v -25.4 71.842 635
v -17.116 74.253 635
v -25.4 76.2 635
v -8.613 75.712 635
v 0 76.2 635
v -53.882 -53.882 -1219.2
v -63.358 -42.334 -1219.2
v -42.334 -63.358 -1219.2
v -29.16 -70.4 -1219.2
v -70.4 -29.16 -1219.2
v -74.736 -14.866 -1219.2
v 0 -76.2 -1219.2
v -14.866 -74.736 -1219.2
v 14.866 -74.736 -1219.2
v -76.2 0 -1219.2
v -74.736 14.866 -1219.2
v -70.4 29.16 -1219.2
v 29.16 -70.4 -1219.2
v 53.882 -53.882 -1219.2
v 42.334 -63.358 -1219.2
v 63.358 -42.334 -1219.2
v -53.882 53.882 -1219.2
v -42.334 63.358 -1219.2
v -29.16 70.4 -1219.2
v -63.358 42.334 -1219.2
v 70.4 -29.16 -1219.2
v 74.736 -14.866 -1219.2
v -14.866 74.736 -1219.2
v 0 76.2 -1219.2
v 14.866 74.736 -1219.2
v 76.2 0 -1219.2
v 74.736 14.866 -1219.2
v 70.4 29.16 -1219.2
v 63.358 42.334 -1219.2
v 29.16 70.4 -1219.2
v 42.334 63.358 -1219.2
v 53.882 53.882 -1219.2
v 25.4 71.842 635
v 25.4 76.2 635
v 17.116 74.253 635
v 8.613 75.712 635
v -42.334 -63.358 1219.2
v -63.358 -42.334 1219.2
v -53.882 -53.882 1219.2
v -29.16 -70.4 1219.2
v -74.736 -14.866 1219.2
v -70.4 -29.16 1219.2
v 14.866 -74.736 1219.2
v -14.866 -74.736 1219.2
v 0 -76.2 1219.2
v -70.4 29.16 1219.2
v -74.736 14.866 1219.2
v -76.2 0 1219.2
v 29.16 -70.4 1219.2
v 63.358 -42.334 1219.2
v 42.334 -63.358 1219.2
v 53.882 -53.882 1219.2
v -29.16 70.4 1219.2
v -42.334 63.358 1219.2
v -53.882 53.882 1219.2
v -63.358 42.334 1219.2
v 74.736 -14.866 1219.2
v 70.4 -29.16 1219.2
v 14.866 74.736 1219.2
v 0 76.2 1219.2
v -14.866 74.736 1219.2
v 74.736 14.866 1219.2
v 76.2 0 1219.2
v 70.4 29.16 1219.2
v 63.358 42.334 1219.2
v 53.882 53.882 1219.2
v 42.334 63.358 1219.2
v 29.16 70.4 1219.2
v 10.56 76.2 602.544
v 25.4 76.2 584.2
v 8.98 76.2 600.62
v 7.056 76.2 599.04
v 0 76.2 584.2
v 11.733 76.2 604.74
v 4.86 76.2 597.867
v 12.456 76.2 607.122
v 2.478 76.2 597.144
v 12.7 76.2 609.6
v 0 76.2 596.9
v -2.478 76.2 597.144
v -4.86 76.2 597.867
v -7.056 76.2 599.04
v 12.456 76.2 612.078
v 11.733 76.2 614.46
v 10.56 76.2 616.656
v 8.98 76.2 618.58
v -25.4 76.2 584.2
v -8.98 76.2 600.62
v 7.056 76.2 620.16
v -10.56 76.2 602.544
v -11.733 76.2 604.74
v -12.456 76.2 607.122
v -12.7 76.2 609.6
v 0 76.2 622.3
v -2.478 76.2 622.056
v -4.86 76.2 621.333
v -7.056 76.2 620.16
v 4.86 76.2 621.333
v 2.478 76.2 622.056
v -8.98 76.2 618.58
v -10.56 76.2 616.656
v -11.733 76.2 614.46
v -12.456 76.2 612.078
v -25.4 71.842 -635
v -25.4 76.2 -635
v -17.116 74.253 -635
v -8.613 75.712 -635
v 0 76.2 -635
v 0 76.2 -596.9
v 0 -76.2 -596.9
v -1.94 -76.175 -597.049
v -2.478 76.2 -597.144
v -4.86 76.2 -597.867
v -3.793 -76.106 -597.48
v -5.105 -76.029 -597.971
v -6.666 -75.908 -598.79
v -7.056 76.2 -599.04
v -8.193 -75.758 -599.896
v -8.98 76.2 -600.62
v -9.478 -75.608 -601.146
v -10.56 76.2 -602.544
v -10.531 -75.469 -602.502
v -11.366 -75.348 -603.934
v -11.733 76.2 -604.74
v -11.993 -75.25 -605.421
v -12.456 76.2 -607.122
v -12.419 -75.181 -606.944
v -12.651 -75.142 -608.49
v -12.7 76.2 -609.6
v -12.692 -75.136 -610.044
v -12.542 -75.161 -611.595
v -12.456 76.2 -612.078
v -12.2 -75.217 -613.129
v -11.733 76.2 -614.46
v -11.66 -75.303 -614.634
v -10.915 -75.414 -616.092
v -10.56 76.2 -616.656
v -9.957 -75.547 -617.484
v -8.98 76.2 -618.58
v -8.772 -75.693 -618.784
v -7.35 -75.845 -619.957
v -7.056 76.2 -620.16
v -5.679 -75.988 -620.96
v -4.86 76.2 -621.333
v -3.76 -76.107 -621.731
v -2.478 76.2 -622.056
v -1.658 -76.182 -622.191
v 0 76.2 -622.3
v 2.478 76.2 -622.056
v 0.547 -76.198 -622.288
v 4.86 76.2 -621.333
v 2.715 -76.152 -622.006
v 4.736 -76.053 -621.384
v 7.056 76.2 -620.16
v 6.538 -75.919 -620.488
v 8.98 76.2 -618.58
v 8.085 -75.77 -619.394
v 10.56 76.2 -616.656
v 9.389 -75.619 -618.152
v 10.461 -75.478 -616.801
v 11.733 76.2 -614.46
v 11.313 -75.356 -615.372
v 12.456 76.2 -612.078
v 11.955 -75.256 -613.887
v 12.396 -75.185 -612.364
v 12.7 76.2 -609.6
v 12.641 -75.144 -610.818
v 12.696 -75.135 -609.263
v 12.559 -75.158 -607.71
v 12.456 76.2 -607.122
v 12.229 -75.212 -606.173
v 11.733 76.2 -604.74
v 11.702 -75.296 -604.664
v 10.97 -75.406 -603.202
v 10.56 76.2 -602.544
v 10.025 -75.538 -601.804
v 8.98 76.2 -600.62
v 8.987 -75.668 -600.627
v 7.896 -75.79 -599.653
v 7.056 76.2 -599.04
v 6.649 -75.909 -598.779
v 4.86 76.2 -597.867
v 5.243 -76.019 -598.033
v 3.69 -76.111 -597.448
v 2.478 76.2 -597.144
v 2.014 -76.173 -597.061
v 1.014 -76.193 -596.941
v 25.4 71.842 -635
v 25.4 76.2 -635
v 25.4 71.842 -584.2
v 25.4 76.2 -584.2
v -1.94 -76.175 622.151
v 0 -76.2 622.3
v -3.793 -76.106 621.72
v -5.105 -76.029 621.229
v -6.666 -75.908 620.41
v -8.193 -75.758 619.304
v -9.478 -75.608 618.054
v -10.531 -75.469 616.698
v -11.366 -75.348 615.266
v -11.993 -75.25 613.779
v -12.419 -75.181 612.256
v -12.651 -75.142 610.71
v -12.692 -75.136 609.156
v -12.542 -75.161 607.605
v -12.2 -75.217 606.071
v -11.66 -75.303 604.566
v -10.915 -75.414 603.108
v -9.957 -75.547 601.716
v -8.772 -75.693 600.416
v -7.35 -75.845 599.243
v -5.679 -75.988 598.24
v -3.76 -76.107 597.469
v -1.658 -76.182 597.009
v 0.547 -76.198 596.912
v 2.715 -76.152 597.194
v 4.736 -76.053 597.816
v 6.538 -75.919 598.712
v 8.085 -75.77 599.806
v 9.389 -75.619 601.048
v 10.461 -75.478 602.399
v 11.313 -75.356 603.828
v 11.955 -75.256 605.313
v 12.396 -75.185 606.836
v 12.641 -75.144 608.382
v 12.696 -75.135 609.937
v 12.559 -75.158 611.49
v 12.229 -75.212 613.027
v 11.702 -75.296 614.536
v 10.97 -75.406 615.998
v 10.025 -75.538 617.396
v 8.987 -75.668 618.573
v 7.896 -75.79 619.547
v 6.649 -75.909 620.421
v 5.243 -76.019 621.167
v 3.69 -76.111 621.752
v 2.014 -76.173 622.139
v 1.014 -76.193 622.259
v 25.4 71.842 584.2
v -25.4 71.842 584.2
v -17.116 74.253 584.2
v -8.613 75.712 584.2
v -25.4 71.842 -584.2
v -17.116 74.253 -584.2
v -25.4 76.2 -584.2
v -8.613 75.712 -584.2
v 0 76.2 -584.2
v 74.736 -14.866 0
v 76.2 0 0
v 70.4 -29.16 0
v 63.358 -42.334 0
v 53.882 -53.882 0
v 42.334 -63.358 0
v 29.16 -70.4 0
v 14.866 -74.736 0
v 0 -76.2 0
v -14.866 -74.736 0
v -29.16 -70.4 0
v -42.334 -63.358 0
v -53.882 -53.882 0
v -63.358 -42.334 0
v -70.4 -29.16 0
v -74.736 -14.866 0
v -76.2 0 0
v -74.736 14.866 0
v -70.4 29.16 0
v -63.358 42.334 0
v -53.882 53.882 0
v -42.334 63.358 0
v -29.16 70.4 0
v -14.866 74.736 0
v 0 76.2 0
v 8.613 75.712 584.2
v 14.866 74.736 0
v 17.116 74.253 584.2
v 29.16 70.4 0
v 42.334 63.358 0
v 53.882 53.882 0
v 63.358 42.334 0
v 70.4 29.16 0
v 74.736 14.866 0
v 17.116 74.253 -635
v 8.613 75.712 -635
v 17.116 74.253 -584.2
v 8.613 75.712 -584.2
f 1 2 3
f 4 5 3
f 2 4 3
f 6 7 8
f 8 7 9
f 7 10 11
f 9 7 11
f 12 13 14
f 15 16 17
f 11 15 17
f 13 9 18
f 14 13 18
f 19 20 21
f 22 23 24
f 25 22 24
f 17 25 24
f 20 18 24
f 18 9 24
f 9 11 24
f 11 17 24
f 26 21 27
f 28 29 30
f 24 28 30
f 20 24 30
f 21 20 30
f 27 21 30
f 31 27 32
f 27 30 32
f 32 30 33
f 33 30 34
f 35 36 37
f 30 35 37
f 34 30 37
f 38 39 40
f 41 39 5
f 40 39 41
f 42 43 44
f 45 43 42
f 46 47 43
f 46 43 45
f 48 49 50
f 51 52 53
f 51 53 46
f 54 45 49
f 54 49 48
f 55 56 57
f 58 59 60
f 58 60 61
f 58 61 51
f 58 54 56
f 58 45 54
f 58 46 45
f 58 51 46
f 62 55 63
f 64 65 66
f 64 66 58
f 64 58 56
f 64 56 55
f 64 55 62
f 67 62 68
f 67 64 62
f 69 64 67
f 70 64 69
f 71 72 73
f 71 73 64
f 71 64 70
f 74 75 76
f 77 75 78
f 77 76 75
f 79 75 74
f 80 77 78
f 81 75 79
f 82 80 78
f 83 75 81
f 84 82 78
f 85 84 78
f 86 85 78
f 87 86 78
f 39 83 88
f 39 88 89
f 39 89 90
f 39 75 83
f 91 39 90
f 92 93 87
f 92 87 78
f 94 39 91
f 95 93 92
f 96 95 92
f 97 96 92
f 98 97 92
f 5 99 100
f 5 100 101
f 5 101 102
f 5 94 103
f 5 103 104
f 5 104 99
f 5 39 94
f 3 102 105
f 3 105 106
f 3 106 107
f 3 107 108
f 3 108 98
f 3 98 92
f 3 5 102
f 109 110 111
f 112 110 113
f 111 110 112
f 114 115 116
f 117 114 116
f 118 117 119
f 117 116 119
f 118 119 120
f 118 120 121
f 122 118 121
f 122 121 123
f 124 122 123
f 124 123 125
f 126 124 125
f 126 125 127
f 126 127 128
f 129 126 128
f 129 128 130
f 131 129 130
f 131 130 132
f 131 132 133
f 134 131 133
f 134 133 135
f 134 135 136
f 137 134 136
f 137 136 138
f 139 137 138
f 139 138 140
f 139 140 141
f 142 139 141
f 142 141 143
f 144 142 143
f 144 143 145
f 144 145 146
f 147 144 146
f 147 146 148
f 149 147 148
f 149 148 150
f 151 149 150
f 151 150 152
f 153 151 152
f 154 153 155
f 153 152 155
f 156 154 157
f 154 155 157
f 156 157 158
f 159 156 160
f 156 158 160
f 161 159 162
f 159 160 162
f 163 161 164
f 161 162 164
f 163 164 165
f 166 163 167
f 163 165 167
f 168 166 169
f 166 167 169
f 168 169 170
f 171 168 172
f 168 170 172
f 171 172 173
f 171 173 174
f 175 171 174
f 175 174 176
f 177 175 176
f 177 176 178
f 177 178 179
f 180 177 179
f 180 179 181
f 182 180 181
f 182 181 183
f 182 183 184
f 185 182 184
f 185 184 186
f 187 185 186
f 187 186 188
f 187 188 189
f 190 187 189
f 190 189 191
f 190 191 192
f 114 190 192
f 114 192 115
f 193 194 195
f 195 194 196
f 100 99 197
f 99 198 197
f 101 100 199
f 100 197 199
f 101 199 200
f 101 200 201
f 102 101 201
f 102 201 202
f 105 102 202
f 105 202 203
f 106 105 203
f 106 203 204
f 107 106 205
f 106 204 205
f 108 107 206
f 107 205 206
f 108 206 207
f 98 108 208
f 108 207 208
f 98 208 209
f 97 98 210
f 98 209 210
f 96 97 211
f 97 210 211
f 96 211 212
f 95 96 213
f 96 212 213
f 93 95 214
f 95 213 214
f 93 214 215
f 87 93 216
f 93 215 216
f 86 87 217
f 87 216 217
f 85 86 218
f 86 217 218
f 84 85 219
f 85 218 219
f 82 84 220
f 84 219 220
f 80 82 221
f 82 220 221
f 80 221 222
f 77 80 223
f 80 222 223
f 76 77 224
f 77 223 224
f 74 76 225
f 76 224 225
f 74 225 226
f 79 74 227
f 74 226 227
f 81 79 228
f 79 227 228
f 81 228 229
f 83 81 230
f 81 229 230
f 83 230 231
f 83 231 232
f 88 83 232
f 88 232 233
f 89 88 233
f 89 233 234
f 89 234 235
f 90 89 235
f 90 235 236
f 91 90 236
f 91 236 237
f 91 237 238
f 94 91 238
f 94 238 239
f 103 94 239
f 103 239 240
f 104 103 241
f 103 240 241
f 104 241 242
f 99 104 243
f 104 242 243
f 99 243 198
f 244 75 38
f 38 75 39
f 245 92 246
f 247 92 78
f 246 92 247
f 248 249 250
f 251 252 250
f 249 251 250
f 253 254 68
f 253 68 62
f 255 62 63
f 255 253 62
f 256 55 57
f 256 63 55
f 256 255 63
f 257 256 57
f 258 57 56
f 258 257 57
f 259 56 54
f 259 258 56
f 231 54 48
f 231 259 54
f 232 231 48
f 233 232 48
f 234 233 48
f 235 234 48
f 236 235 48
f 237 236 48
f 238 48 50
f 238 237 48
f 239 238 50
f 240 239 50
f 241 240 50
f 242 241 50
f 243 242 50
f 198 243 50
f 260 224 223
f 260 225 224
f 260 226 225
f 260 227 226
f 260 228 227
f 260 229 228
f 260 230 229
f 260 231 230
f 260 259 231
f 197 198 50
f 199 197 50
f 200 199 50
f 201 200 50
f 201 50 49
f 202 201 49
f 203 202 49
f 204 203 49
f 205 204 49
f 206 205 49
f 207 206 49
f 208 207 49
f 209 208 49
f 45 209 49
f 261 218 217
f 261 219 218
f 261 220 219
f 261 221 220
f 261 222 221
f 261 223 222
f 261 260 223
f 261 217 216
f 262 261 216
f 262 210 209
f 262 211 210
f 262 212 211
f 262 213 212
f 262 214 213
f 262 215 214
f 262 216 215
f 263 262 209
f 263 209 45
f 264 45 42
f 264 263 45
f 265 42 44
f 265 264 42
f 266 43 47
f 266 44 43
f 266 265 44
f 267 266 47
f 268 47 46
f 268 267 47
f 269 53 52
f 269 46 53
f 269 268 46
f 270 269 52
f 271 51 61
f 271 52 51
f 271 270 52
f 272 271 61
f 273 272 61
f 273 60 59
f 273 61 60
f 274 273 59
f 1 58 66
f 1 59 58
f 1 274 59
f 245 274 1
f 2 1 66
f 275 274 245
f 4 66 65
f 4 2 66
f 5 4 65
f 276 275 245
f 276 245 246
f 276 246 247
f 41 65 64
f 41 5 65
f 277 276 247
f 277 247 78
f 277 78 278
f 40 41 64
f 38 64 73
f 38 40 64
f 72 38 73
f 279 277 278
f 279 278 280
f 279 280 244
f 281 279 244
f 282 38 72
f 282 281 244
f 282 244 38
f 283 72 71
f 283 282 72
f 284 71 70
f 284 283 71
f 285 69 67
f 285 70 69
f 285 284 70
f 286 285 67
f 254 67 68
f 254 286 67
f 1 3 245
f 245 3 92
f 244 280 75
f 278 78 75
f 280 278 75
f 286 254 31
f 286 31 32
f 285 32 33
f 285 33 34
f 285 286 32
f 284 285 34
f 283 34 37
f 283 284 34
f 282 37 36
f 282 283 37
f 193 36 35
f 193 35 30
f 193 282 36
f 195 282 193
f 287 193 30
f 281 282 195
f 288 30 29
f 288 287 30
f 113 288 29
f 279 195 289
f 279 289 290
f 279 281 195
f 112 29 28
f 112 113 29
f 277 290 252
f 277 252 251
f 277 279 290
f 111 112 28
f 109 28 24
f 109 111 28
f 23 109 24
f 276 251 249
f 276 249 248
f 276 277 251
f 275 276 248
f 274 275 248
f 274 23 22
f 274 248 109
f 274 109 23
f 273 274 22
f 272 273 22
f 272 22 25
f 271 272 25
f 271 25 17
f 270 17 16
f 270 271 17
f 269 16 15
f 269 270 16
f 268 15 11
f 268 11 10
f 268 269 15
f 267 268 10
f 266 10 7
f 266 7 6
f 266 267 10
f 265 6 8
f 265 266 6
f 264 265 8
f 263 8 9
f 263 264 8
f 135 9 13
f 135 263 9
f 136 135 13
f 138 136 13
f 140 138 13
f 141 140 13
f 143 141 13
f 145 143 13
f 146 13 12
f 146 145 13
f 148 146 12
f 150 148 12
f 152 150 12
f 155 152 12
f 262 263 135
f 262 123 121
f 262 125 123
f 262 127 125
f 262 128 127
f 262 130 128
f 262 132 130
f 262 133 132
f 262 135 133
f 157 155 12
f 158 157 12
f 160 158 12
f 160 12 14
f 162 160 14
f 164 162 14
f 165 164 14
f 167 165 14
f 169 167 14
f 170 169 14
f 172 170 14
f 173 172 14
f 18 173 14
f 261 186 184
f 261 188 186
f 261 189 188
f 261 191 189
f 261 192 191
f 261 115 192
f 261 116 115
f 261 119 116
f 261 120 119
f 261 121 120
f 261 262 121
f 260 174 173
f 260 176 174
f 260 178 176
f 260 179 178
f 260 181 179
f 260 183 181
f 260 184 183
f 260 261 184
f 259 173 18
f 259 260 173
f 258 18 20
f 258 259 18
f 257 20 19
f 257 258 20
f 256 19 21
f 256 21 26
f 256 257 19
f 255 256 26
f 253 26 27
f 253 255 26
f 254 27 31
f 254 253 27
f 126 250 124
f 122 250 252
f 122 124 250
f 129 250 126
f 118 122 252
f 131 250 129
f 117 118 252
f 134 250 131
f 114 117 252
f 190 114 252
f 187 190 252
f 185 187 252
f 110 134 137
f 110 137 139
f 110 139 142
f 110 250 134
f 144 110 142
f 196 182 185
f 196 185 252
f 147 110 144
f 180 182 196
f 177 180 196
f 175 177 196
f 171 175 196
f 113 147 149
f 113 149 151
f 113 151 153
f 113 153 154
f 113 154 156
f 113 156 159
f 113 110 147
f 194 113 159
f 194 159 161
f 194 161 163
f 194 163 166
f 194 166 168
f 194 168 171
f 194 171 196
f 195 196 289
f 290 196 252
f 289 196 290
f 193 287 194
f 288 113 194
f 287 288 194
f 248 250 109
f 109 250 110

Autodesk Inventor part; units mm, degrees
ref_plane "YZ Plane" through (0, 0, 0) normal (1, 0, 0) x (0, 1, 0)
ref_plane "XY Plane" through (0, 0, 0) normal (0, 0, 1) x (1, 0, 0)
sketch "Sketch1" plane through (0, 0, 0) normal (0, 0, 1) x (1, 0, 0)
  circle A0 centre (0, 0) radius 76.2
  dimension "d0" = 152.4
extrude "Extrusion1" add sketch "Sketch1" along normal mid plane 2438.4
ref_plane "Work Plane2" through (0, 76.2, 0) normal (0, 1, 0) x (-1, 0, 0)
sketch "Sketch4" plane through (0, 76.2, 0) normal (0, 1, 0) x (-1, 0, 0)
  line L0 (25.4, 635) -> (25.4, 584.2)
  line L1 (25.4, 584.2) -> (-25.4, 584.2)
  line L2 (-25.4, 584.2) -> (-25.4, 635)
  line L3 (-25.4, 635) -> (25.4, 635)
  line L4 (25.4, 635) -> (-25.4, 584.2) construction
  line L5 (25.4, 584.2) -> (-25.4, 635) construction
  line L6 (76.2, 1219.2) -> (-76.2, 1219.2) projected
  point P0 (0, 0)
  point P1 (0, 609.6)
  dimension "d17" = 50.8
  dimension "d19" = 609.6
extrude "Extrusion3" add sketch "Sketch4" against normal blind 25.4
mirror "Mirror1" about plane through (0, 0, 0) normal (0, 0, 1) of "Extrusion3"
sketch "Sketch5" plane through (0, 76.2, 0) normal (0, 1, 0) x (1, 0, 0)
  line L0 (76.2, 1219.2) -> (-76.2, 1219.2) projected
  line L1 (-76.2, -1219.2) -> (76.2, -1219.2) projected
  point P0 (0, 0)
  point P1 (0, -609.6)
  point P2 (0, 609.6)
  dimension "d22" = 609.6
  dimension "d23" = 609.6
hole "Hole2" at (0, 76.2, 609.6) at (0, 76.2, -609.6) direction (0, -1, 0) diameter 25.4 end through all
properties part number "CrossMember-6-Feet" material "Wood (Walnut)"
